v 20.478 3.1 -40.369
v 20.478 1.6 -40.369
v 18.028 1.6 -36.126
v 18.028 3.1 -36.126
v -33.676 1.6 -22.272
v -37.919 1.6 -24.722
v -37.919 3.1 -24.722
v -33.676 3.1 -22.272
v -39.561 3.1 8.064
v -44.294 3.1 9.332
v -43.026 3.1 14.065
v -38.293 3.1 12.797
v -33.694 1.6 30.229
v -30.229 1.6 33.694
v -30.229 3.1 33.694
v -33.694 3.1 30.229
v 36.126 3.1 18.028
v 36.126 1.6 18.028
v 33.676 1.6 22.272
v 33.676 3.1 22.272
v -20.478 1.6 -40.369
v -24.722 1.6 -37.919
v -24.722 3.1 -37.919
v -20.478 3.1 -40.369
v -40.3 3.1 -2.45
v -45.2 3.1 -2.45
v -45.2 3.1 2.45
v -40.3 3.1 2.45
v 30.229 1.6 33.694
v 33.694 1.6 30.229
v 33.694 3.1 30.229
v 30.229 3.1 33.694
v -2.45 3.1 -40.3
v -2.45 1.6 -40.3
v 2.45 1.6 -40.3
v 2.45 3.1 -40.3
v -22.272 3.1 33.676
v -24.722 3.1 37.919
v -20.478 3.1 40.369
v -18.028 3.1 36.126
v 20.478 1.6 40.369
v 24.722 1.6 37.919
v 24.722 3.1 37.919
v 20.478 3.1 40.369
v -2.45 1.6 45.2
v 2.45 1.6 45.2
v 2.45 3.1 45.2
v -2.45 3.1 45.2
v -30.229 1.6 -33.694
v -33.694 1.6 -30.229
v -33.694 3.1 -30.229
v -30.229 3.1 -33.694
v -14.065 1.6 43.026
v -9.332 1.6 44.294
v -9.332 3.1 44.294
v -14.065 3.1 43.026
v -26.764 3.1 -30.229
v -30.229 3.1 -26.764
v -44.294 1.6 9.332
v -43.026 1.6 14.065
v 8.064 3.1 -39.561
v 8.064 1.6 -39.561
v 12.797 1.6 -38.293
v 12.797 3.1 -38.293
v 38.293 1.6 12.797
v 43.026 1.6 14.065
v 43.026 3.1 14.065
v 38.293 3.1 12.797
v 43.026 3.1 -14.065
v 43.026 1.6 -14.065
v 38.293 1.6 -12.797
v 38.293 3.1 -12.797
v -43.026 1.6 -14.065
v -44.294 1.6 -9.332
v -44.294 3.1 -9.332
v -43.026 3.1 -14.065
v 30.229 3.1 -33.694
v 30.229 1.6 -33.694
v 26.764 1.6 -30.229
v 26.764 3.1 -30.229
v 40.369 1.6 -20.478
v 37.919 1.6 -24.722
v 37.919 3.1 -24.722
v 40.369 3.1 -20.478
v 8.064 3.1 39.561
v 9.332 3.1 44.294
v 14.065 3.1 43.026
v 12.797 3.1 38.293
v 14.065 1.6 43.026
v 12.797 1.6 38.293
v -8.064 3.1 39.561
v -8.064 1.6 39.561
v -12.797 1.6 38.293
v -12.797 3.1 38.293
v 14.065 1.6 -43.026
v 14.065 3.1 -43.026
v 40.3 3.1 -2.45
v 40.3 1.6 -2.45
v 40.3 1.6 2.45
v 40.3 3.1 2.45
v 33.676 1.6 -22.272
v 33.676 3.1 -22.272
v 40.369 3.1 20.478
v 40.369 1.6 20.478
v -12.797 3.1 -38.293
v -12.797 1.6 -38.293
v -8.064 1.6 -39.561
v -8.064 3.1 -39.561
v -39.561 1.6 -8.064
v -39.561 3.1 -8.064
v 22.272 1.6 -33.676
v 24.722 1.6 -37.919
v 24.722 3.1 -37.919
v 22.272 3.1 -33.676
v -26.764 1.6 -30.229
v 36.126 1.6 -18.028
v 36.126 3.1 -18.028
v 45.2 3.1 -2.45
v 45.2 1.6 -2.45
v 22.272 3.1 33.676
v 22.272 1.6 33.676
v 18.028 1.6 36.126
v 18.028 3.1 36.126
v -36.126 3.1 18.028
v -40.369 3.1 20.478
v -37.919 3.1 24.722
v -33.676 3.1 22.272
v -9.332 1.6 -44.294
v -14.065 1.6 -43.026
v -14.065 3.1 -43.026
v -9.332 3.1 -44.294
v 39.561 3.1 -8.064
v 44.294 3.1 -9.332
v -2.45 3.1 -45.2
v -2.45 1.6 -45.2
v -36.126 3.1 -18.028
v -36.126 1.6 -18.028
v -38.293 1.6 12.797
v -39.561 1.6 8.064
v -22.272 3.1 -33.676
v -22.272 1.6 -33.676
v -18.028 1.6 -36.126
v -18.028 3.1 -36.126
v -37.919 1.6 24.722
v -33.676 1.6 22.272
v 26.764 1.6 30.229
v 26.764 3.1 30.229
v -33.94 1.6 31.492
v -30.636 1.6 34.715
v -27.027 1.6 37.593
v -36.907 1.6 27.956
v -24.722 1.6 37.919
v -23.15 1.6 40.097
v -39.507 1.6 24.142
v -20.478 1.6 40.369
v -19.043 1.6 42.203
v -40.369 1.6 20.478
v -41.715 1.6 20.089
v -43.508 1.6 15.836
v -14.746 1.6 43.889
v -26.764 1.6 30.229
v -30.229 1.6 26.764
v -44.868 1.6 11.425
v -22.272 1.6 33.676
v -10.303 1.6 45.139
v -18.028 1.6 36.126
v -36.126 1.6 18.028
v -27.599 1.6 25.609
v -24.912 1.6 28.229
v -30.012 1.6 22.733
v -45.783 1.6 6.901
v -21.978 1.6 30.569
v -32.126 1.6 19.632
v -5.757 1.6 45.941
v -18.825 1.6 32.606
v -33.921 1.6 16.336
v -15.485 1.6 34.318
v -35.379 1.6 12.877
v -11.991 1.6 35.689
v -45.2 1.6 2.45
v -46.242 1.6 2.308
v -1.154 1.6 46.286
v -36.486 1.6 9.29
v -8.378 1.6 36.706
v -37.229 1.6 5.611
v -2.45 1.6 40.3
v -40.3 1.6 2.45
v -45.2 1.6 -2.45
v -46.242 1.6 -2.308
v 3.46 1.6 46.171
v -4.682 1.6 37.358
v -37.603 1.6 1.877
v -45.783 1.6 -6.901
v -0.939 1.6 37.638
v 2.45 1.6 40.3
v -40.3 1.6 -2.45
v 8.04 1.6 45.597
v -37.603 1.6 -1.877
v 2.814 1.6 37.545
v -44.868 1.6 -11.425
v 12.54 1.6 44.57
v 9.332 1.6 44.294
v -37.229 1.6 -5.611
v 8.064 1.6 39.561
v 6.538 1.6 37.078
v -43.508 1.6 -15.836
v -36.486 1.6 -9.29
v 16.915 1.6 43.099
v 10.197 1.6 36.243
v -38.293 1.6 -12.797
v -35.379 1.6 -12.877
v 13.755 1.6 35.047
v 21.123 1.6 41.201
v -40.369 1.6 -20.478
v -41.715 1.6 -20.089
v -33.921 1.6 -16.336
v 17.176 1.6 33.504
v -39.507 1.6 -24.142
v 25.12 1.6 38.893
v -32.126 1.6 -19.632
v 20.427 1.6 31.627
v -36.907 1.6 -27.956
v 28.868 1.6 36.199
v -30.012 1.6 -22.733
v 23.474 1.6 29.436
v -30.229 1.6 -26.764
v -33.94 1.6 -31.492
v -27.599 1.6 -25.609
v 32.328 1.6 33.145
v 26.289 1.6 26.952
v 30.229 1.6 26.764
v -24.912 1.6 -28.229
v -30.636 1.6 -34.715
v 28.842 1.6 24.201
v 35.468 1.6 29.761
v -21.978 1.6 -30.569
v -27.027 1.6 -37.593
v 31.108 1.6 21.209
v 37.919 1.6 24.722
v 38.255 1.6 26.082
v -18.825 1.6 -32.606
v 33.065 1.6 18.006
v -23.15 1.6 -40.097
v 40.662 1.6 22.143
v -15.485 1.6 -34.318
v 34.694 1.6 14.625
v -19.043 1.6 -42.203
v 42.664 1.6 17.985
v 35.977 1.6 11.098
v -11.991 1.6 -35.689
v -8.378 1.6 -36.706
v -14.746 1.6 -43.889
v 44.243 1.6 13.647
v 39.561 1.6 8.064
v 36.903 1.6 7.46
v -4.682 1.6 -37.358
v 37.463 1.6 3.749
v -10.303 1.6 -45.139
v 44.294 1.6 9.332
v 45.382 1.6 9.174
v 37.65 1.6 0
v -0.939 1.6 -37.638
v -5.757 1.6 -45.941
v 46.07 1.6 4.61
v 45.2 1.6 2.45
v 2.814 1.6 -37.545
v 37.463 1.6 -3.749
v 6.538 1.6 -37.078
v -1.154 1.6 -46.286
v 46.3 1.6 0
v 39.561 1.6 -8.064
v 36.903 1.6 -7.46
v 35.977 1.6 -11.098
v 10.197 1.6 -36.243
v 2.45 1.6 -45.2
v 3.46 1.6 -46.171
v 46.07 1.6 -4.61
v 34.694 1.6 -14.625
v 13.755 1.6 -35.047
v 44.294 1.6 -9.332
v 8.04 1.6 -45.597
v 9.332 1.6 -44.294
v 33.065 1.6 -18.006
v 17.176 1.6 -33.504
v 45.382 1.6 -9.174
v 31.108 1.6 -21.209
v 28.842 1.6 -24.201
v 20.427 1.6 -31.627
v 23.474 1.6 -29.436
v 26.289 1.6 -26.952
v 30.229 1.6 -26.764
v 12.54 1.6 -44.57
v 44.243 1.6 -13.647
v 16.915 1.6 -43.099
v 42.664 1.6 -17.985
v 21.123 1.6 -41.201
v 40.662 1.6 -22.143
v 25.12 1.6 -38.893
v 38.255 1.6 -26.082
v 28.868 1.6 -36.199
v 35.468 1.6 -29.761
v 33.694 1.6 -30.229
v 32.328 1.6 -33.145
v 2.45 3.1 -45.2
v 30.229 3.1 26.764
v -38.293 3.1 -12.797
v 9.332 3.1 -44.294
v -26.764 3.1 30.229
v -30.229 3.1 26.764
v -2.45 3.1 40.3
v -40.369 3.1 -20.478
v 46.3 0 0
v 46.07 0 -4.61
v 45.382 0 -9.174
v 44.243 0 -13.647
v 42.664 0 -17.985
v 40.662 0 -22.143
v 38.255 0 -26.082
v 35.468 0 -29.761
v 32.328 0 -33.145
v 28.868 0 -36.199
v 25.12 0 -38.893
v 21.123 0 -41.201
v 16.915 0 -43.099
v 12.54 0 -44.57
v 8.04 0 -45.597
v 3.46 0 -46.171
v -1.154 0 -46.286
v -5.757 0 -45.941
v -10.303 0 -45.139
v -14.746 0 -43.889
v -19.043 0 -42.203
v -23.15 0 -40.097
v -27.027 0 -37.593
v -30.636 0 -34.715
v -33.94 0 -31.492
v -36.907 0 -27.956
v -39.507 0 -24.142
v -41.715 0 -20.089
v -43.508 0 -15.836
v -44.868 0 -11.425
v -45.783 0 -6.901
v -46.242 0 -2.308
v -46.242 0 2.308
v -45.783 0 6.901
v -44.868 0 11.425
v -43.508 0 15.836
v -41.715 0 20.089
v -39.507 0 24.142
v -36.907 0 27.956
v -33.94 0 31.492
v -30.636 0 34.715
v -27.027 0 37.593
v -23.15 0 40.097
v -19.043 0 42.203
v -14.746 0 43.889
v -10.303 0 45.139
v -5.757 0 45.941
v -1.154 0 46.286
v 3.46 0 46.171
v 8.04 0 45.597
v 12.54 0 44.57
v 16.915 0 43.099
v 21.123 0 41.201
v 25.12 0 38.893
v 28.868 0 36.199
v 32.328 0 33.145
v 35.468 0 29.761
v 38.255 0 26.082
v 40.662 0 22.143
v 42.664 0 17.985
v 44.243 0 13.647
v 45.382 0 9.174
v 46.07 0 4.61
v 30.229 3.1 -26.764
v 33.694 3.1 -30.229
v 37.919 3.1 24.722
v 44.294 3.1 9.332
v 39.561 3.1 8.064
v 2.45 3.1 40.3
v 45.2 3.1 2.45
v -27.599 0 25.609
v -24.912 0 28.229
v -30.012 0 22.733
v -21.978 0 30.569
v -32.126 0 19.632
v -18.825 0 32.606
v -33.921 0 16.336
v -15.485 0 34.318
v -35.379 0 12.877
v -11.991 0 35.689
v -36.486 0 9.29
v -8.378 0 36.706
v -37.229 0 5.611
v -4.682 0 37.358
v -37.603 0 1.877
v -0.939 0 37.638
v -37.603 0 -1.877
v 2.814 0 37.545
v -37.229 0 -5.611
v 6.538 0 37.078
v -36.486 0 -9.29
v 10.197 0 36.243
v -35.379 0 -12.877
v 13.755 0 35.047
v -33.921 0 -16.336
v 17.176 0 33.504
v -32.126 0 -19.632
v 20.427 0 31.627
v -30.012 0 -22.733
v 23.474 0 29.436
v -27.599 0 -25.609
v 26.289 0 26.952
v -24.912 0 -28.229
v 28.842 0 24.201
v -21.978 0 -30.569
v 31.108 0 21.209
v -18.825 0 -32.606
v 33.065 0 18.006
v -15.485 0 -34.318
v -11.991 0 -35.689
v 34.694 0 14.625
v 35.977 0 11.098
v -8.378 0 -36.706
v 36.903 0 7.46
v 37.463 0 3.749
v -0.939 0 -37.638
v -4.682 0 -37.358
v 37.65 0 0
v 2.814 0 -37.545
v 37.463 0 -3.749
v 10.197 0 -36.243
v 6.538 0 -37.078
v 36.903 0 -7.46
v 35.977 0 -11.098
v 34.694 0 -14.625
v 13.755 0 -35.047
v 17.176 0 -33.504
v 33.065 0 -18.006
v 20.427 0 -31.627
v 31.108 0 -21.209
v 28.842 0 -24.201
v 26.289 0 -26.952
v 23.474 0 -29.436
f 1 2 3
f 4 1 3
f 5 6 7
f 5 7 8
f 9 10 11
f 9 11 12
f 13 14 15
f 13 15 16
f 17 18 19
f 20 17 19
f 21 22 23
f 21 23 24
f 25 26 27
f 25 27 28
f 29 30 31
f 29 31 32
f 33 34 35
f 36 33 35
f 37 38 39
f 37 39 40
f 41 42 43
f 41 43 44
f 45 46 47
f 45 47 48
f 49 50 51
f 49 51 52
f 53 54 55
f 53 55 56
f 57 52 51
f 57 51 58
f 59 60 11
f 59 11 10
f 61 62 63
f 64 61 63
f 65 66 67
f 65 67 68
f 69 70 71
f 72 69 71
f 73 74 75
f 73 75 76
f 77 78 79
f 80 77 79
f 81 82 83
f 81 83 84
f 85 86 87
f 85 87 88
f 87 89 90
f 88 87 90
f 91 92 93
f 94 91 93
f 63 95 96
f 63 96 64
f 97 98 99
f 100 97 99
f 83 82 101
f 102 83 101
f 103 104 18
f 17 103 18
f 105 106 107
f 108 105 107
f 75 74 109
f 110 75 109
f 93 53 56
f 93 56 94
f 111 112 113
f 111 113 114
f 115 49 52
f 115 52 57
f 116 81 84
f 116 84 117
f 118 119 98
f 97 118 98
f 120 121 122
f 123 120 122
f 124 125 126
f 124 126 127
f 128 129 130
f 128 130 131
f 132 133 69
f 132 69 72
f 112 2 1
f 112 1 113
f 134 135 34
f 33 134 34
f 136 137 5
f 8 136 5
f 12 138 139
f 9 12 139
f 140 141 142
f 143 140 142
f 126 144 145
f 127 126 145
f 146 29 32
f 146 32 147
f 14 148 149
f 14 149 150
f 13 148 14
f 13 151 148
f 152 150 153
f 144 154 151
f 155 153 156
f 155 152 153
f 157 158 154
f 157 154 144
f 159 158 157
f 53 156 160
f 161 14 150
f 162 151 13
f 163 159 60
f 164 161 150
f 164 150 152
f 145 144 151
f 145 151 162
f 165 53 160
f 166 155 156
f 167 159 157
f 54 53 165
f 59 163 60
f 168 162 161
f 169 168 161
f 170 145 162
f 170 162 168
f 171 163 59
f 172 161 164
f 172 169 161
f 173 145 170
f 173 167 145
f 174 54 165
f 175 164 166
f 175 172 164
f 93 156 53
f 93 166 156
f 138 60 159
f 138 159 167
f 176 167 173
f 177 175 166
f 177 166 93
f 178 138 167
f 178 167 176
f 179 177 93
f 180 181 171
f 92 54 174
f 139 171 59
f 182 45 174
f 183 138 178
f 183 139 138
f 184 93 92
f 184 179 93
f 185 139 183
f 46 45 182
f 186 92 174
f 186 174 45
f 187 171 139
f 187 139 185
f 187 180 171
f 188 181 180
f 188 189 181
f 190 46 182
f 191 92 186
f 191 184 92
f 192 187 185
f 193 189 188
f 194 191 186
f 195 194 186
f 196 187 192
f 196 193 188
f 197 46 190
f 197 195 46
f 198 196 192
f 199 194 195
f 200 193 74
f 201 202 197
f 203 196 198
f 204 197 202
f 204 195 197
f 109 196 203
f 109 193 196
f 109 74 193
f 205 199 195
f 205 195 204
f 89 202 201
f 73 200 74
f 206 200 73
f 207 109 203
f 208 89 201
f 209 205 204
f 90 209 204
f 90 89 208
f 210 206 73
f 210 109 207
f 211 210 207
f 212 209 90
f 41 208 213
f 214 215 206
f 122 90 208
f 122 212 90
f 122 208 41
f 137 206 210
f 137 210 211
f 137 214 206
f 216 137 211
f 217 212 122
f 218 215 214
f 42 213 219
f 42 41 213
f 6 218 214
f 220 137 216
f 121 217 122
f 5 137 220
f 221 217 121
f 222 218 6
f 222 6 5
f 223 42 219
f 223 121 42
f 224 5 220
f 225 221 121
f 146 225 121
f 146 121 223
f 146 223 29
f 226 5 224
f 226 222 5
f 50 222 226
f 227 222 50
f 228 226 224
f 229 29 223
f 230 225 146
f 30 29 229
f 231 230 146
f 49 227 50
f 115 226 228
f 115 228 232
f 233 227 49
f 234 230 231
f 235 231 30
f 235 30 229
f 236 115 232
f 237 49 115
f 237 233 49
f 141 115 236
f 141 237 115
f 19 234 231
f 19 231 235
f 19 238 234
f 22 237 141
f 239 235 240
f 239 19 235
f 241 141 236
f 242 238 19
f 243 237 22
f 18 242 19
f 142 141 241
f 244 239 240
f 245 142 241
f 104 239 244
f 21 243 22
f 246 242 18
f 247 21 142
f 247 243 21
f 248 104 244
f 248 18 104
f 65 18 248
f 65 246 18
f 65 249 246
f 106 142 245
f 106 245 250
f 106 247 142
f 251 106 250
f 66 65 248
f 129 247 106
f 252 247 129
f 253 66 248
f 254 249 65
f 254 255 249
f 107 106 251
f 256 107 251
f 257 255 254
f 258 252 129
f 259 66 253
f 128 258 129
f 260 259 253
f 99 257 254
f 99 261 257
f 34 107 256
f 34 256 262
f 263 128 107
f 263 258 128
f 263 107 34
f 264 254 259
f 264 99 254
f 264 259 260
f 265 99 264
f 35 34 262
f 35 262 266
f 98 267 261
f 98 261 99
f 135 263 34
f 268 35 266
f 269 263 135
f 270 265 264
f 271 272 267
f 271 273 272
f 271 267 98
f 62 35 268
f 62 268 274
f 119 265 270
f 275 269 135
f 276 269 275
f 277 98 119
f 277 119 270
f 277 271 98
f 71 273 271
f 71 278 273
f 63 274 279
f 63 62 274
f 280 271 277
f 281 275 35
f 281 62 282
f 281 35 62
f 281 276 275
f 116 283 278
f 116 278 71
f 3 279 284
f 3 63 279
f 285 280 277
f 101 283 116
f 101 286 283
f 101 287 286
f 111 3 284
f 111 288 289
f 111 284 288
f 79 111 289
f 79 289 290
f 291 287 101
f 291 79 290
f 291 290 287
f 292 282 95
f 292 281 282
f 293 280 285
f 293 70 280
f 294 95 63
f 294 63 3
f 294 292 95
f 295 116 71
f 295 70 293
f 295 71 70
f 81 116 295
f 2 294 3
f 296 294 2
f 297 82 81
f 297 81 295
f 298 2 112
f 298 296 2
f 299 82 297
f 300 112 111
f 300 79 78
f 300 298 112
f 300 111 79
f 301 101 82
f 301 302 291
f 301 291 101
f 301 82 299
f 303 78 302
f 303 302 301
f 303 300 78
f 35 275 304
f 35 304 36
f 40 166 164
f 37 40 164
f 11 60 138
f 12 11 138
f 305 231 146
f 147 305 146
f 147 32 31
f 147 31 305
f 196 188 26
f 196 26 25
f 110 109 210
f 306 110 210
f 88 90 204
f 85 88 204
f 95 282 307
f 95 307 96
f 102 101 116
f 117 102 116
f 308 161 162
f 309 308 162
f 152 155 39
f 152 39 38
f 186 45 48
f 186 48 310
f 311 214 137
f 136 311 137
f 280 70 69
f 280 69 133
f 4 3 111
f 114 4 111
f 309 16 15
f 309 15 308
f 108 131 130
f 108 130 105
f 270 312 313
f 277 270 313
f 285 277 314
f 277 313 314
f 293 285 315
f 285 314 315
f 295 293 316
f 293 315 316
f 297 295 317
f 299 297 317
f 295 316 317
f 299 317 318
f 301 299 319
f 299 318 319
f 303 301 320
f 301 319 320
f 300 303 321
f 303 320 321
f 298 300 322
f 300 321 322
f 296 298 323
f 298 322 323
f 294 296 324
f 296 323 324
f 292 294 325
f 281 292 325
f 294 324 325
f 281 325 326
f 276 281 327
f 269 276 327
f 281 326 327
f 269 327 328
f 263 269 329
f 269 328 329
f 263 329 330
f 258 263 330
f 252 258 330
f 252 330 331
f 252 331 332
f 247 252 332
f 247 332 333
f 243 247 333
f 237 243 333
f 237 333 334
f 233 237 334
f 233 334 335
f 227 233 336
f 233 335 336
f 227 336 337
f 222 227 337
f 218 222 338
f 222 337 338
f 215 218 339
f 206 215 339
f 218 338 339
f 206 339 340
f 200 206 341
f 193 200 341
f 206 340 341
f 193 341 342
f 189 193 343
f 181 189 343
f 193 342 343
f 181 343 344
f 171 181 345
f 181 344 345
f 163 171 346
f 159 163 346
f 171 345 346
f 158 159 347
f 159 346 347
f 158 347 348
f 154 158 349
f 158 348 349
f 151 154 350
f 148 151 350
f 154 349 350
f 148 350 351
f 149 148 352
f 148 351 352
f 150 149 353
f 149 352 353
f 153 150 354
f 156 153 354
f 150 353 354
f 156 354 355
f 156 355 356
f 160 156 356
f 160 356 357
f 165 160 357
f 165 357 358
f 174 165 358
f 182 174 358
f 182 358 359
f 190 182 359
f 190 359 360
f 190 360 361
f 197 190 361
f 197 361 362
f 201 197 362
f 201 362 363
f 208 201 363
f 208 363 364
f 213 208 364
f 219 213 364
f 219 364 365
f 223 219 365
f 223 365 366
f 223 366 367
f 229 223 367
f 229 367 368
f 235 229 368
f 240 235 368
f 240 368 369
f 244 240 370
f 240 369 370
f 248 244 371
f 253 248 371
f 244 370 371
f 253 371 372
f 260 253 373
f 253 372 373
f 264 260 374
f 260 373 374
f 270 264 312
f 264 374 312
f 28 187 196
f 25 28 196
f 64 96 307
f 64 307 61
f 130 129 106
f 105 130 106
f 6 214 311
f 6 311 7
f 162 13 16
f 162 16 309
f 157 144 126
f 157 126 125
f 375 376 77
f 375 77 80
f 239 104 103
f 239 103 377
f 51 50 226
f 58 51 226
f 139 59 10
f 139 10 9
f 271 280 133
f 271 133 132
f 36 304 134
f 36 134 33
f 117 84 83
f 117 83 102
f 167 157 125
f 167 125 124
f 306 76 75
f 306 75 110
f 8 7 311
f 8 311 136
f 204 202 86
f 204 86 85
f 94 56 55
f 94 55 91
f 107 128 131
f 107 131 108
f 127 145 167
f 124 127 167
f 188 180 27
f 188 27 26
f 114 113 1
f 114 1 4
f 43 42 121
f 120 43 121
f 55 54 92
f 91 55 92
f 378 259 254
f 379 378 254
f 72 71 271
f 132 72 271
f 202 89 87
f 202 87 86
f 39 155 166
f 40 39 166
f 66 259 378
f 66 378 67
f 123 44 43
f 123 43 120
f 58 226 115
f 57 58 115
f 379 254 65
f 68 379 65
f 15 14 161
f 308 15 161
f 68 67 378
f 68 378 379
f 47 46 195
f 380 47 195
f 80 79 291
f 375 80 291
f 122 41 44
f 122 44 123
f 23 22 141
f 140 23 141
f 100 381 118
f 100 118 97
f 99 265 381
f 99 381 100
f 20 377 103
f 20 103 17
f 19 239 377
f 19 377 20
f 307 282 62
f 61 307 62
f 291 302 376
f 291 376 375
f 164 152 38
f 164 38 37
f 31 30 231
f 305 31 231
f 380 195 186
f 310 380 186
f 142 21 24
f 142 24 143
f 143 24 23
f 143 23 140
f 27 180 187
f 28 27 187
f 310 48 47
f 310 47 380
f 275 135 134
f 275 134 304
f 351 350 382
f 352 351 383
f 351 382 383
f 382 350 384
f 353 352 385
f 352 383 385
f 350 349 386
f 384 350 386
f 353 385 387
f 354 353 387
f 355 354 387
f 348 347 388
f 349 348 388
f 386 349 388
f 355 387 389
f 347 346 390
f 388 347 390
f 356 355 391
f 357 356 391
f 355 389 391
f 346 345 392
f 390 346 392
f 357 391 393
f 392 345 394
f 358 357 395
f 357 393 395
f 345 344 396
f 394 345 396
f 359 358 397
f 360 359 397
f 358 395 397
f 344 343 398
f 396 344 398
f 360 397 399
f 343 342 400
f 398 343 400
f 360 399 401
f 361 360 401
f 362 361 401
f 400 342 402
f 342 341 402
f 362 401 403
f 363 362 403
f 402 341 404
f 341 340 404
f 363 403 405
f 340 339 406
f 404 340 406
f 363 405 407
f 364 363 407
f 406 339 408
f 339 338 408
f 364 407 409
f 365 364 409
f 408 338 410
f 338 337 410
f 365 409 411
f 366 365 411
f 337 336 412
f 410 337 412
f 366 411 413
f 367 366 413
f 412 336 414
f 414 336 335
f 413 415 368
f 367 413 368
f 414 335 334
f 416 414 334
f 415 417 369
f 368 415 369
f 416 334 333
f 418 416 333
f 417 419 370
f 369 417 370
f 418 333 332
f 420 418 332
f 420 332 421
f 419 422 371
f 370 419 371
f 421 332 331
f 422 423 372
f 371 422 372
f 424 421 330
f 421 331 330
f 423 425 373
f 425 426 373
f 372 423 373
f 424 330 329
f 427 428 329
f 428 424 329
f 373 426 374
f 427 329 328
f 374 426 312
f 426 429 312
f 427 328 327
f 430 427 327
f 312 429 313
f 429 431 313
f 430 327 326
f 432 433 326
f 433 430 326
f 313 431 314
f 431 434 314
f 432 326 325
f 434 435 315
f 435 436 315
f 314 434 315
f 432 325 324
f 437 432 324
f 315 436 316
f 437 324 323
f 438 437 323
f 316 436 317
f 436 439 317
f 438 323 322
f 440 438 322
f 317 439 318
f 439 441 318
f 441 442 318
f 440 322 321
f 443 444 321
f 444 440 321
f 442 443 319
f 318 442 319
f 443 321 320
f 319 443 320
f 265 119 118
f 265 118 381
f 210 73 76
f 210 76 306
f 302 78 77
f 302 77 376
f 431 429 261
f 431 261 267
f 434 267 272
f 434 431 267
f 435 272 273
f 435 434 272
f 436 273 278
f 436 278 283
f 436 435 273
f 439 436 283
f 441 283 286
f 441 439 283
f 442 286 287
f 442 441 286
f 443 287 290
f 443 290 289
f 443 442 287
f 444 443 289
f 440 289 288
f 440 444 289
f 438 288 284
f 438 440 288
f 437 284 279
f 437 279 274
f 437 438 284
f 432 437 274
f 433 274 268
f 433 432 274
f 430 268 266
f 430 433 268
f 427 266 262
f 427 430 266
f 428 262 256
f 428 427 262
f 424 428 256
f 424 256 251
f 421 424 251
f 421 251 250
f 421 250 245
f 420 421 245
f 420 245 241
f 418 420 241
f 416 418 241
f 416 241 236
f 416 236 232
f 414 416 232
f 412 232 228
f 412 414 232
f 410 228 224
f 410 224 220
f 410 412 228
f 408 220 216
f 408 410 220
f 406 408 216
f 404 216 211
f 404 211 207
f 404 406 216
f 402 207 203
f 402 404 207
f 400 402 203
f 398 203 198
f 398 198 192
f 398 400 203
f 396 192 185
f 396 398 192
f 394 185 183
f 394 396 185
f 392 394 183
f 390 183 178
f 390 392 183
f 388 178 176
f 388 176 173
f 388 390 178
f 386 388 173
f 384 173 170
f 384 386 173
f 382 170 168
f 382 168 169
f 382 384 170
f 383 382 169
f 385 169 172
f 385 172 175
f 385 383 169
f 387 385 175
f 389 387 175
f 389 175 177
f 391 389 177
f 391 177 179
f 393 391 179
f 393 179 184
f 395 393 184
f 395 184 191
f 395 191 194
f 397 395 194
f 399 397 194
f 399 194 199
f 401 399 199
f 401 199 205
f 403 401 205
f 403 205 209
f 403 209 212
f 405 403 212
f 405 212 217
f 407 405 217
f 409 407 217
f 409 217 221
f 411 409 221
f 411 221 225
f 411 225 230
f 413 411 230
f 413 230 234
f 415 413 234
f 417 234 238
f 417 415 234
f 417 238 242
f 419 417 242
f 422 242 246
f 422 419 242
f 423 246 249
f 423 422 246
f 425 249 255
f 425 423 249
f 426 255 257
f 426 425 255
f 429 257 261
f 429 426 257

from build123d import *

# Parameters (mm, degrees)
SKETCH_1_R               = 46.3
SKETCH_1_R_2             = 37.65
EXTRUDE_1_DEPTH          = 1.6
SKETCH_2_W               = 4.9
SKETCH_2_H               = 4.9
EXTRUDE_2_DEPTH          = 1.5
PATTERN_CIRCULAR_1_COUNT = 24


with BuildPart() as part:
    # 草图1 → 凸台-拉伸1 (new body)
    with BuildSketch(Plane(origin=(0, 0, 0), x_dir=(1, 0, 0), z_dir=(0, 1, 0))):
        Circle(SKETCH_1_R)
        Circle(SKETCH_1_R_2, mode=Mode.SUBTRACT)
    extrude(amount=EXTRUDE_1_DEPTH)

    # 草图2 → 凸台-拉伸2 (add)
    with BuildSketch(Plane(origin=(0, 1.6, 0), x_dir=(1, 0, 0), z_dir=(0, 1, 0))):
        with Locations((-42.75, 0)):
            Rectangle(SKETCH_2_W, SKETCH_2_H)
    extrude_2 = extrude(amount=EXTRUDE_2_DEPTH)

    # 阵列(圆周)1: 凸台-拉伸2 ×24 about axis
    pattern_circular_1_axis = Axis((0, 0, 0), (0, 1, 0))
    for i in range(1, PATTERN_CIRCULAR_1_COUNT):
        add(extrude_2.rotate(pattern_circular_1_axis, i * 360 / PATTERN_CIRCULAR_1_COUNT))


solid = part.part
